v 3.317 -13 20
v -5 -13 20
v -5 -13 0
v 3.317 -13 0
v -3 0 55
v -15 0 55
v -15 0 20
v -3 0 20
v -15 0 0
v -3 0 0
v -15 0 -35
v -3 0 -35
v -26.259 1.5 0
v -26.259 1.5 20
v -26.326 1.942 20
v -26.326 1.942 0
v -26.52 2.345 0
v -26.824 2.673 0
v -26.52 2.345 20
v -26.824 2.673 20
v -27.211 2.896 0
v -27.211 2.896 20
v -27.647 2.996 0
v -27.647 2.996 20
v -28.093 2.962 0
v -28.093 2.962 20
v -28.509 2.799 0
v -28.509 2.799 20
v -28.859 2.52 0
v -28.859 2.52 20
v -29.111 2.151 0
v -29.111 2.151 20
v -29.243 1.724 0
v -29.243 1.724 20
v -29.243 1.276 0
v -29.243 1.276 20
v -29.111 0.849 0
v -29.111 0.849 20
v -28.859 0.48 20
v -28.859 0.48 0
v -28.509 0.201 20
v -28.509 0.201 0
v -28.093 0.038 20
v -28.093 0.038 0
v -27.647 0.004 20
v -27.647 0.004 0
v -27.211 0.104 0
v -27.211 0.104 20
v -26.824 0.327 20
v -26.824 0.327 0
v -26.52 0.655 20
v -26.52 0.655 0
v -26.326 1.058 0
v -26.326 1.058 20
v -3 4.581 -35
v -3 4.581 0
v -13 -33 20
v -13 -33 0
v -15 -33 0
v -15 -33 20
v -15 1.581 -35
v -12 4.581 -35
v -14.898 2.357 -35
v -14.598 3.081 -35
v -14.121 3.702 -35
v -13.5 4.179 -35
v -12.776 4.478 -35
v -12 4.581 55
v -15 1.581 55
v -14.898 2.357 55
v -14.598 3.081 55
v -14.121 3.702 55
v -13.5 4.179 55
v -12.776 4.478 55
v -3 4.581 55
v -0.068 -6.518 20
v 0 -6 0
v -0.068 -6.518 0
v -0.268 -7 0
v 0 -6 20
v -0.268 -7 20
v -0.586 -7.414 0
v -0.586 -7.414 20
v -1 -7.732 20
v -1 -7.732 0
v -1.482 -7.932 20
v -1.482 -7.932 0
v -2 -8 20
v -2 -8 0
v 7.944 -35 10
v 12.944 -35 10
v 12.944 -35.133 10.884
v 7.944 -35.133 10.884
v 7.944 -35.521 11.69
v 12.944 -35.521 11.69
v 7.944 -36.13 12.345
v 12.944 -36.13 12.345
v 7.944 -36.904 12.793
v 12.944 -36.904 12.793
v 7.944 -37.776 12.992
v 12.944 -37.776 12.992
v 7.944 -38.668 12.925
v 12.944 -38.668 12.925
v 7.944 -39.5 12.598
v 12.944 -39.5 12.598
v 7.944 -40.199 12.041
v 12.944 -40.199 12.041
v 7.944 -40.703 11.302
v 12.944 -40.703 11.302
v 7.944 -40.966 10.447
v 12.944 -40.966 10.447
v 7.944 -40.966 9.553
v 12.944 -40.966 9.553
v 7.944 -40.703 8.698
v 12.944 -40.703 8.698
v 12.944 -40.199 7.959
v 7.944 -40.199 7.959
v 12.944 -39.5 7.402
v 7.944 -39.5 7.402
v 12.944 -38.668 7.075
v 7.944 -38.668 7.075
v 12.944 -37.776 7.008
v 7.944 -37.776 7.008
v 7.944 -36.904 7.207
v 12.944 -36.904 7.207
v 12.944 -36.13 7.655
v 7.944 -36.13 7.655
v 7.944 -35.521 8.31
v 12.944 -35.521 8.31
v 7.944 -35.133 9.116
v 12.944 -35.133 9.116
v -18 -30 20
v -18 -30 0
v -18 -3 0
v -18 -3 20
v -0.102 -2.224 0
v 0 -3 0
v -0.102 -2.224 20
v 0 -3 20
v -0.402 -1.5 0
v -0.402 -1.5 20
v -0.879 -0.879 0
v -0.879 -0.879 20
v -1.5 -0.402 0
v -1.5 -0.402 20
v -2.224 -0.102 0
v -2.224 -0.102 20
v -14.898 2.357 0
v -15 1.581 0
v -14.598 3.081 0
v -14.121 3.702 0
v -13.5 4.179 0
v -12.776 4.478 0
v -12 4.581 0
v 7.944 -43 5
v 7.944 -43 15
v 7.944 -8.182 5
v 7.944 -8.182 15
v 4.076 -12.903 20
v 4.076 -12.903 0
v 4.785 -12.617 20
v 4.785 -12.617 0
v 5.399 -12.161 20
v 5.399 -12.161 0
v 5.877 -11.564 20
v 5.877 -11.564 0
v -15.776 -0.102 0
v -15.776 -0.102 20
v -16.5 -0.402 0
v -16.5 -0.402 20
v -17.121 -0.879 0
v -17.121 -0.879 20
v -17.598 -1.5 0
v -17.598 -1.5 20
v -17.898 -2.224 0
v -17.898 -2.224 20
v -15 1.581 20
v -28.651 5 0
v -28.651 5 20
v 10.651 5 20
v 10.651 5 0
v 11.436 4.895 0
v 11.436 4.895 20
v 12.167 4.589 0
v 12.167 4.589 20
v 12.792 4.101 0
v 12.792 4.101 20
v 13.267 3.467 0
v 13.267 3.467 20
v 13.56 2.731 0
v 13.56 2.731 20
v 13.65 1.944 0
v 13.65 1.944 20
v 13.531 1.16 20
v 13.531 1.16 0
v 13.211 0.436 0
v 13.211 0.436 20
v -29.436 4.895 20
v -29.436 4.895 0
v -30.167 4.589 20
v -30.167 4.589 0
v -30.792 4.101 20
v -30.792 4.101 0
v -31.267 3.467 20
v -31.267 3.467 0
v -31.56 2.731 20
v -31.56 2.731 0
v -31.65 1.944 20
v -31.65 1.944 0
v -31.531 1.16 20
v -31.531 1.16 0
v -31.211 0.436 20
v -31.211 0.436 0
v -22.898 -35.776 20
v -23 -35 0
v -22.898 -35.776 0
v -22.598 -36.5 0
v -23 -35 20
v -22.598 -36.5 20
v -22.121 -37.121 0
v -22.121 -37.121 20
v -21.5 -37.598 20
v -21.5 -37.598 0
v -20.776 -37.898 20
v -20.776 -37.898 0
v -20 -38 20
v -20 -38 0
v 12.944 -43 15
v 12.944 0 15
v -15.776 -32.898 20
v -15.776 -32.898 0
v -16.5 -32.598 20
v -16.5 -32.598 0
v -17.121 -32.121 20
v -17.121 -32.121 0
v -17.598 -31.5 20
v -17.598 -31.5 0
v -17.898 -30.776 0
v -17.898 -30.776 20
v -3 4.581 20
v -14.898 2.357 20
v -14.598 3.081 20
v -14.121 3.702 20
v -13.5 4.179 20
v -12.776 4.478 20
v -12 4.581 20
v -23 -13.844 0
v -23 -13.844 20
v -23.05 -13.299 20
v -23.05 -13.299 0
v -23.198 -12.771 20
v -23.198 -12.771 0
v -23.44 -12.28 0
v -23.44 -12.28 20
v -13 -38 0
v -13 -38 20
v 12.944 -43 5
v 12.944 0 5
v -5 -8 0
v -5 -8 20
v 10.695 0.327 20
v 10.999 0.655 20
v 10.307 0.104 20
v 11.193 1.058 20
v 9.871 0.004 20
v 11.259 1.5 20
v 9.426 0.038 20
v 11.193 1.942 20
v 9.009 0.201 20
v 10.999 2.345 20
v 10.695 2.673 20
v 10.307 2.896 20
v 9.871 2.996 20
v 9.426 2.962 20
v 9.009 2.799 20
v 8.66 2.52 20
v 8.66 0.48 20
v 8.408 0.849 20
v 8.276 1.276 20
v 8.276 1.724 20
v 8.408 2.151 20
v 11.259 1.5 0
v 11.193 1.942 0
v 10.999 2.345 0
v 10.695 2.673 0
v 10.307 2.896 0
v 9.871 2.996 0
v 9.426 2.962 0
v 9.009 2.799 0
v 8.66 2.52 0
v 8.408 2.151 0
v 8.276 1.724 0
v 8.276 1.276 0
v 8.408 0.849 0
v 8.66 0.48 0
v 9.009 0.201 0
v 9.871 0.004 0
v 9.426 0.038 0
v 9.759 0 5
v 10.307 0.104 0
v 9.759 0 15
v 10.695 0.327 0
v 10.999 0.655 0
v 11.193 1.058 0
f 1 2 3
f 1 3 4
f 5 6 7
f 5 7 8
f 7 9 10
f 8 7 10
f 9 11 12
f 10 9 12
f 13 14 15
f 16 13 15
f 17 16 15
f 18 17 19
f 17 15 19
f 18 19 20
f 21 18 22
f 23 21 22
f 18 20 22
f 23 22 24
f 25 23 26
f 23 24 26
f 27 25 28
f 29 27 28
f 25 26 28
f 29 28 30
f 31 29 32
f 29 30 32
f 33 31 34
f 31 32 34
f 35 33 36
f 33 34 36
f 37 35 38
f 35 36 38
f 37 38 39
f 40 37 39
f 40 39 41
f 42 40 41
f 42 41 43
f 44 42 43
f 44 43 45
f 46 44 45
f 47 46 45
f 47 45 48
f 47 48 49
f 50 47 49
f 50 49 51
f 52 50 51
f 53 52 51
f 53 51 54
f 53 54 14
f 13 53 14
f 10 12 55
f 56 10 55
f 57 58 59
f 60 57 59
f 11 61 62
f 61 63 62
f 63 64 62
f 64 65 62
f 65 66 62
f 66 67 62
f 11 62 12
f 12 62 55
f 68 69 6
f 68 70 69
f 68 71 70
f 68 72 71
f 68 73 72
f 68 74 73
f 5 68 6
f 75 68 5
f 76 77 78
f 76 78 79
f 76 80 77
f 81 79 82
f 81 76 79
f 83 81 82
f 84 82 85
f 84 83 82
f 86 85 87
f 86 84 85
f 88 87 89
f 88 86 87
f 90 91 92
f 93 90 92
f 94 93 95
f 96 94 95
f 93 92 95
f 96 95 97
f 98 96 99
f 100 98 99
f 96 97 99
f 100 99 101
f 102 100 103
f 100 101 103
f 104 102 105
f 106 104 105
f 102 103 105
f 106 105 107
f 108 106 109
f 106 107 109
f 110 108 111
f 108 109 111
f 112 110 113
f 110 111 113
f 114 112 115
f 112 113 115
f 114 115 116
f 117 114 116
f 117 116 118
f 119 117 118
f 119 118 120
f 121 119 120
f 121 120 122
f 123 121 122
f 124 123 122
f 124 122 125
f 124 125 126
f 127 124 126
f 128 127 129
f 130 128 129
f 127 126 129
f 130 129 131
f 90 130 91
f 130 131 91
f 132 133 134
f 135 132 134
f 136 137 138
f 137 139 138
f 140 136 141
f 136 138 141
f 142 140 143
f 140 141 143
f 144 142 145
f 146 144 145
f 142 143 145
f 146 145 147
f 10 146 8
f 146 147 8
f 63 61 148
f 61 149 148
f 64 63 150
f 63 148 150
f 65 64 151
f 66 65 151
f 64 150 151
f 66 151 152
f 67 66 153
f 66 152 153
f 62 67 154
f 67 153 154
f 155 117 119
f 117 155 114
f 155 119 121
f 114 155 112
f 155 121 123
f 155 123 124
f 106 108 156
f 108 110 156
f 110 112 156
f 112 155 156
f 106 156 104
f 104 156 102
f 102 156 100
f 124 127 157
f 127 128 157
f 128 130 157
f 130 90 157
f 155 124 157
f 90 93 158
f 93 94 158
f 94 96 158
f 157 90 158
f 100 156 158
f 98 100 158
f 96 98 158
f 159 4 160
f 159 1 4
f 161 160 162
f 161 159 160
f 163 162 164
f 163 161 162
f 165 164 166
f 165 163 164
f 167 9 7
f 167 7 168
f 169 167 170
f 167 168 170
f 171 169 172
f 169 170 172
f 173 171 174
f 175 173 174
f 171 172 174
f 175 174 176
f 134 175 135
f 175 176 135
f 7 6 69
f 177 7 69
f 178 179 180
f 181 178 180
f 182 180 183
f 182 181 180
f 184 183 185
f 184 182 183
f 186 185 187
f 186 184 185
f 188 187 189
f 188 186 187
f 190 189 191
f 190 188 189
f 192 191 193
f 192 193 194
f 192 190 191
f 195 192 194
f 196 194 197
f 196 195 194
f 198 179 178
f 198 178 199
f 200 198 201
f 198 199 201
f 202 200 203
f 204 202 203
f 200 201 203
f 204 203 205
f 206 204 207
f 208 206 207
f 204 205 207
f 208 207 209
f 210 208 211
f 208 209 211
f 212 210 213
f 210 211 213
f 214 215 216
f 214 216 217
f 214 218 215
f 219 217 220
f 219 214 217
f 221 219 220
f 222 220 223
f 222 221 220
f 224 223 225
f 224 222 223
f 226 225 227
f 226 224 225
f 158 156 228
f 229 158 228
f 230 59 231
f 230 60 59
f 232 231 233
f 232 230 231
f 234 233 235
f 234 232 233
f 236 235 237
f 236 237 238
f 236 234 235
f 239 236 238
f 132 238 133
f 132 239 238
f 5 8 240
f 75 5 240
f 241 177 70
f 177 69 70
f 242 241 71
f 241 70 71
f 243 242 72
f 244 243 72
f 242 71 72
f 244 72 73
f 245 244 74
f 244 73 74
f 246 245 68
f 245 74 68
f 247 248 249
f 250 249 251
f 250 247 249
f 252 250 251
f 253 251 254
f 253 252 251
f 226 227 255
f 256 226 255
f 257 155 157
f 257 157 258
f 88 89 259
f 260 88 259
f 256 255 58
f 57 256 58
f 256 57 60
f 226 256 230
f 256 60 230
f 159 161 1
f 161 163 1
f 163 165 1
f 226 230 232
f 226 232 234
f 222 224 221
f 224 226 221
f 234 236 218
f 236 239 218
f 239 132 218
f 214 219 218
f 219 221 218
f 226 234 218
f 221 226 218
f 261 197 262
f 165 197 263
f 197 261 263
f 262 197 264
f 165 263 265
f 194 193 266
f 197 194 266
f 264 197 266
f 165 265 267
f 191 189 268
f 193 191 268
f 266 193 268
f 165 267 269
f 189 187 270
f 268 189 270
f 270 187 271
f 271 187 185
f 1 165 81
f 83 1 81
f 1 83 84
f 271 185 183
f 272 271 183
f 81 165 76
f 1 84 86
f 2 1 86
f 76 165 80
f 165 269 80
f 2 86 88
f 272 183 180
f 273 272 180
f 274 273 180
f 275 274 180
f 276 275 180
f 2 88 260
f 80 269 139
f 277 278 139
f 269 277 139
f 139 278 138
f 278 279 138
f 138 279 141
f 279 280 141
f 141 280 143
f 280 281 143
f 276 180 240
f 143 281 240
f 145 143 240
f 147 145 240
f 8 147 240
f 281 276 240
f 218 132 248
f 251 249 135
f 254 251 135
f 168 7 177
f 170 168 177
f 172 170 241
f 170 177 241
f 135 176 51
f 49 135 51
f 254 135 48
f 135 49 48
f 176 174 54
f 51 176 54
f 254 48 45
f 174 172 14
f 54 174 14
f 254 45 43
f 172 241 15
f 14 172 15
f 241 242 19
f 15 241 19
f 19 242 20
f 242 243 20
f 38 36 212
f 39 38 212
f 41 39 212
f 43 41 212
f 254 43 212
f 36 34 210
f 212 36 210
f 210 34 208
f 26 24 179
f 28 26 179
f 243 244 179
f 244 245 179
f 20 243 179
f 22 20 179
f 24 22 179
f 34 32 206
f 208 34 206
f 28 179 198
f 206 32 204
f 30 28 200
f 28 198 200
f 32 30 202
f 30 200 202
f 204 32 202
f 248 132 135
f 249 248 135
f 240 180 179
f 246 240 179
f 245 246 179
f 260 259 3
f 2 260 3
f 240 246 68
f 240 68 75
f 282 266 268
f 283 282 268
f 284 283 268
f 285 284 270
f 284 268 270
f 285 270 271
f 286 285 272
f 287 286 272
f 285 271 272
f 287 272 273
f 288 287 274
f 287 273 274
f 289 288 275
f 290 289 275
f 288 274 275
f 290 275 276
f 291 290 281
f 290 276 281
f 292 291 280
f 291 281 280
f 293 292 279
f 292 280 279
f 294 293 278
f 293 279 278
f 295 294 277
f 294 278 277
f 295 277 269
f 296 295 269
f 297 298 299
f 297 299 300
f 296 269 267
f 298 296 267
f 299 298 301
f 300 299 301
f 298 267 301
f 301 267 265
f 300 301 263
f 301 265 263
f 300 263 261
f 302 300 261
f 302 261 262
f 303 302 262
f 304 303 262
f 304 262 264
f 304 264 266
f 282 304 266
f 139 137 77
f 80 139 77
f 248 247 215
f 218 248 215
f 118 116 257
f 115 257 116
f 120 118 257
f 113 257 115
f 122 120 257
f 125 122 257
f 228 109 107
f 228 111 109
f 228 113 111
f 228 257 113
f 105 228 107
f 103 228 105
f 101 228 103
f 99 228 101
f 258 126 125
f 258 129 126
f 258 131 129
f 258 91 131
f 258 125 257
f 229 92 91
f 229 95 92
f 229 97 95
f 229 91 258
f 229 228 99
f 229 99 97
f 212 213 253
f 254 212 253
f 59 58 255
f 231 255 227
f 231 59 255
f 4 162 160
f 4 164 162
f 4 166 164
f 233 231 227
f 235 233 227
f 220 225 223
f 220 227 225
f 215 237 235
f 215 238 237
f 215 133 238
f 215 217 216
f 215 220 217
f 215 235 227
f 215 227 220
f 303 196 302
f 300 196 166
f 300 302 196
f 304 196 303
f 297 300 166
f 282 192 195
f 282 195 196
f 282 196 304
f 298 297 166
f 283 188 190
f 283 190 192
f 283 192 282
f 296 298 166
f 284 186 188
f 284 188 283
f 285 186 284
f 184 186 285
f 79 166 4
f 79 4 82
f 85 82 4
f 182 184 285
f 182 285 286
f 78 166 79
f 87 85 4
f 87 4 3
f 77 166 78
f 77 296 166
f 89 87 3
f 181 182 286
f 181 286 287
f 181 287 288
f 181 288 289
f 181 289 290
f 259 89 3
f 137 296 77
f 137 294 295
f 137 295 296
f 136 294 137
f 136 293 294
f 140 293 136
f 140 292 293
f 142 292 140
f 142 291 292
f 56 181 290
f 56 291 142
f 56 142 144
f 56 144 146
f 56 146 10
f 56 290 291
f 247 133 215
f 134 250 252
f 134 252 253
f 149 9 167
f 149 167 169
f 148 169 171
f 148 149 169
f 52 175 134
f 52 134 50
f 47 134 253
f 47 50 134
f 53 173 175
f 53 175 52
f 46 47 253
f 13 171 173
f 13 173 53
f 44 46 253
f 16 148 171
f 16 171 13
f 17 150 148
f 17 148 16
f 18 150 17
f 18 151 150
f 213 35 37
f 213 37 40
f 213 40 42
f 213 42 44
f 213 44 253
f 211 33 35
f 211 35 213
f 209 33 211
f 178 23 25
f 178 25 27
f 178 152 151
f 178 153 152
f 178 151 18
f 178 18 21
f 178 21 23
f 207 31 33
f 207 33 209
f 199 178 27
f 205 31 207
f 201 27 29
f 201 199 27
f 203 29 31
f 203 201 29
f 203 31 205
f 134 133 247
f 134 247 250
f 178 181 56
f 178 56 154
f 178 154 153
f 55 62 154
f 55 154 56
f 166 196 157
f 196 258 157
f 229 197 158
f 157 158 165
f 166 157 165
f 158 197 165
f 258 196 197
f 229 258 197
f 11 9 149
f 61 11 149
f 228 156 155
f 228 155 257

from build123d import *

# Parameters (mm, degrees)
EXTRUDE_THIN1_DEPTH = 20
BOSS_EXTRUDE1_DEPTH = 20
FILLET1_R           = 3
CUT_EXTRUDE1_REACH  = 55.346
SKETCH4_R           = 1.5
FILLET2_R           = 3
FILLET3_R           = 2
SKETCH5_W           = 12
SKETCH5_H           = 4.580516002
BOSS_EXTRUDE2_DEPTH = 35
BOSS_EXTRUDE3_START = -55
SKETCH5_2_W         = 12
SKETCH5_2_H         = 4.580516002
BOSS_EXTRUDE3_DEPTH = 35
FILLET4_R           = 3
BOSS_EXTRUDE4_START = -5
SKETCH6_W           = 5
SKETCH6_H           = 43
BOSS_EXTRUDE4_DEPTH = 10
SKETCH7_R           = 3
CUT_EXTRUDE2_DEPTH  = 5


with BuildPart() as part:
    # Sketch2 → Extrude-Thin1 (new body)
    with BuildSketch(Plane.XY):
        Polygon((-13, -33), (-18, -33), (-18, 0), (0, 0), (0, -8), (-5, -8), (-5, -13), (5, -13), (5, 5), (-23, 5), (-23, -38), (-13, -38), align=None)
    extrude(amount=EXTRUDE_THIN1_DEPTH)

    # Sketch3 → Boss-Extrude1 (add)
    with BuildSketch(Plane.XY.offset(20)):
        Polygon((5, 5), (16, 5), (5, -13), align=None)
        Polygon((-23, 5), (-34, 5), (-23, -13), align=None)
    extrude(amount=-BOSS_EXTRUDE1_DEPTH)

    # Fillet1
    fillet1_edges = [part.edges().sort_by_distance(p)[0] for p in [
        (-23, -38, 10),
        (5, -13, 10),
        (-18, -33, 10),
        (16, 5, 10),
        (-34, 5, 10),
        (-23, -13, 10),
    ]]
    fillet(fillet1_edges, radius=FILLET1_R)

    # Sketch4 → Cut-Extrude1 (cut, up to next)
    with BuildSketch(Plane.XY.offset(20), mode=Mode.PRIVATE) as cut_extrude1_sk1:
        with Locations((9.759301062, 1.5)):
            Circle(SKETCH4_R)
    cut_extrude1_tool1 = extrude(cut_extrude1_sk1.sketch, amount=-CUT_EXTRUDE1_REACH, mode=Mode.PRIVATE) & part.part
    # Sketch4 → Cut-Extrude1 (cut, up to next)
    with BuildSketch(Plane.XY.offset(20), mode=Mode.PRIVATE) as cut_extrude1_sk2:
        with Locations((-27.759301062, 1.5)):
            Circle(SKETCH4_R)
    cut_extrude1_tool2 = extrude(cut_extrude1_sk2.sketch, amount=-CUT_EXTRUDE1_REACH, mode=Mode.PRIVATE) & part.part
    add(cut_extrude1_tool1.solids().sort_by_distance((9.759301, 1.5, 20))[0], mode=Mode.SUBTRACT)
    add(cut_extrude1_tool2.solids().sort_by_distance((-27.759301, 1.5, 20))[0], mode=Mode.SUBTRACT)

    # Fillet2
    fillet2_edges = [part.edges().sort_by_distance(p)[0] for p in [
        (0, 0, 10),
        (-18, 0, 10),
    ]]
    fillet(fillet2_edges, radius=FILLET2_R)

    # Fillet3
    fillet3_edges = [part.edges().sort_by_distance(p)[0] for p in [
        (0, -8, 10),
    ]]
    fillet(fillet3_edges, radius=FILLET3_R)

    # Sketch5 → Boss-Extrude2 (add)
    with BuildSketch(Plane.XY.offset(20)):
        with Locations((-9, 2.290258001)):
            Rectangle(SKETCH5_W, SKETCH5_H)
    extrude(amount=BOSS_EXTRUDE2_DEPTH)

    # Sketch5<2> → Boss-Extrude3 (add)
    with BuildSketch(Plane.XY.offset(20).offset(BOSS_EXTRUDE3_START)):
        with Locations((-9, 2.290258001)):
            Rectangle(SKETCH5_2_W, SKETCH5_2_H)
    extrude(amount=BOSS_EXTRUDE3_DEPTH)

    # Fillet4
    fillet4_edges = [part.edges().sort_by_distance(p)[0] for p in [
        (-15, 4.580516002, 37.5),
        (-15, 4.580516002, -17.5),
    ]]
    fillet(fillet4_edges, radius=FILLET4_R)

    # Sketch6 → Boss-Extrude4 (add)
    with BuildSketch(Plane.XY.offset(20).offset(BOSS_EXTRUDE4_START)):
        with Locations((10.444444444, -21.5)):
            Rectangle(SKETCH6_W, SKETCH6_H)
    extrude(amount=-BOSS_EXTRUDE4_DEPTH)

    # Sketch7 → Cut-Extrude2 (cut)
    with BuildSketch(Plane(origin=(12.944444444, 0, 0), x_dir=(0, 0, -1), z_dir=(1, 0, 0))):
        with Locations(Location((-10, -38, 0), (0, 0, 90))):
            Circle(SKETCH7_R)
    extrude(amount=-CUT_EXTRUDE2_DEPTH, mode=Mode.SUBTRACT)


solid = part.part
